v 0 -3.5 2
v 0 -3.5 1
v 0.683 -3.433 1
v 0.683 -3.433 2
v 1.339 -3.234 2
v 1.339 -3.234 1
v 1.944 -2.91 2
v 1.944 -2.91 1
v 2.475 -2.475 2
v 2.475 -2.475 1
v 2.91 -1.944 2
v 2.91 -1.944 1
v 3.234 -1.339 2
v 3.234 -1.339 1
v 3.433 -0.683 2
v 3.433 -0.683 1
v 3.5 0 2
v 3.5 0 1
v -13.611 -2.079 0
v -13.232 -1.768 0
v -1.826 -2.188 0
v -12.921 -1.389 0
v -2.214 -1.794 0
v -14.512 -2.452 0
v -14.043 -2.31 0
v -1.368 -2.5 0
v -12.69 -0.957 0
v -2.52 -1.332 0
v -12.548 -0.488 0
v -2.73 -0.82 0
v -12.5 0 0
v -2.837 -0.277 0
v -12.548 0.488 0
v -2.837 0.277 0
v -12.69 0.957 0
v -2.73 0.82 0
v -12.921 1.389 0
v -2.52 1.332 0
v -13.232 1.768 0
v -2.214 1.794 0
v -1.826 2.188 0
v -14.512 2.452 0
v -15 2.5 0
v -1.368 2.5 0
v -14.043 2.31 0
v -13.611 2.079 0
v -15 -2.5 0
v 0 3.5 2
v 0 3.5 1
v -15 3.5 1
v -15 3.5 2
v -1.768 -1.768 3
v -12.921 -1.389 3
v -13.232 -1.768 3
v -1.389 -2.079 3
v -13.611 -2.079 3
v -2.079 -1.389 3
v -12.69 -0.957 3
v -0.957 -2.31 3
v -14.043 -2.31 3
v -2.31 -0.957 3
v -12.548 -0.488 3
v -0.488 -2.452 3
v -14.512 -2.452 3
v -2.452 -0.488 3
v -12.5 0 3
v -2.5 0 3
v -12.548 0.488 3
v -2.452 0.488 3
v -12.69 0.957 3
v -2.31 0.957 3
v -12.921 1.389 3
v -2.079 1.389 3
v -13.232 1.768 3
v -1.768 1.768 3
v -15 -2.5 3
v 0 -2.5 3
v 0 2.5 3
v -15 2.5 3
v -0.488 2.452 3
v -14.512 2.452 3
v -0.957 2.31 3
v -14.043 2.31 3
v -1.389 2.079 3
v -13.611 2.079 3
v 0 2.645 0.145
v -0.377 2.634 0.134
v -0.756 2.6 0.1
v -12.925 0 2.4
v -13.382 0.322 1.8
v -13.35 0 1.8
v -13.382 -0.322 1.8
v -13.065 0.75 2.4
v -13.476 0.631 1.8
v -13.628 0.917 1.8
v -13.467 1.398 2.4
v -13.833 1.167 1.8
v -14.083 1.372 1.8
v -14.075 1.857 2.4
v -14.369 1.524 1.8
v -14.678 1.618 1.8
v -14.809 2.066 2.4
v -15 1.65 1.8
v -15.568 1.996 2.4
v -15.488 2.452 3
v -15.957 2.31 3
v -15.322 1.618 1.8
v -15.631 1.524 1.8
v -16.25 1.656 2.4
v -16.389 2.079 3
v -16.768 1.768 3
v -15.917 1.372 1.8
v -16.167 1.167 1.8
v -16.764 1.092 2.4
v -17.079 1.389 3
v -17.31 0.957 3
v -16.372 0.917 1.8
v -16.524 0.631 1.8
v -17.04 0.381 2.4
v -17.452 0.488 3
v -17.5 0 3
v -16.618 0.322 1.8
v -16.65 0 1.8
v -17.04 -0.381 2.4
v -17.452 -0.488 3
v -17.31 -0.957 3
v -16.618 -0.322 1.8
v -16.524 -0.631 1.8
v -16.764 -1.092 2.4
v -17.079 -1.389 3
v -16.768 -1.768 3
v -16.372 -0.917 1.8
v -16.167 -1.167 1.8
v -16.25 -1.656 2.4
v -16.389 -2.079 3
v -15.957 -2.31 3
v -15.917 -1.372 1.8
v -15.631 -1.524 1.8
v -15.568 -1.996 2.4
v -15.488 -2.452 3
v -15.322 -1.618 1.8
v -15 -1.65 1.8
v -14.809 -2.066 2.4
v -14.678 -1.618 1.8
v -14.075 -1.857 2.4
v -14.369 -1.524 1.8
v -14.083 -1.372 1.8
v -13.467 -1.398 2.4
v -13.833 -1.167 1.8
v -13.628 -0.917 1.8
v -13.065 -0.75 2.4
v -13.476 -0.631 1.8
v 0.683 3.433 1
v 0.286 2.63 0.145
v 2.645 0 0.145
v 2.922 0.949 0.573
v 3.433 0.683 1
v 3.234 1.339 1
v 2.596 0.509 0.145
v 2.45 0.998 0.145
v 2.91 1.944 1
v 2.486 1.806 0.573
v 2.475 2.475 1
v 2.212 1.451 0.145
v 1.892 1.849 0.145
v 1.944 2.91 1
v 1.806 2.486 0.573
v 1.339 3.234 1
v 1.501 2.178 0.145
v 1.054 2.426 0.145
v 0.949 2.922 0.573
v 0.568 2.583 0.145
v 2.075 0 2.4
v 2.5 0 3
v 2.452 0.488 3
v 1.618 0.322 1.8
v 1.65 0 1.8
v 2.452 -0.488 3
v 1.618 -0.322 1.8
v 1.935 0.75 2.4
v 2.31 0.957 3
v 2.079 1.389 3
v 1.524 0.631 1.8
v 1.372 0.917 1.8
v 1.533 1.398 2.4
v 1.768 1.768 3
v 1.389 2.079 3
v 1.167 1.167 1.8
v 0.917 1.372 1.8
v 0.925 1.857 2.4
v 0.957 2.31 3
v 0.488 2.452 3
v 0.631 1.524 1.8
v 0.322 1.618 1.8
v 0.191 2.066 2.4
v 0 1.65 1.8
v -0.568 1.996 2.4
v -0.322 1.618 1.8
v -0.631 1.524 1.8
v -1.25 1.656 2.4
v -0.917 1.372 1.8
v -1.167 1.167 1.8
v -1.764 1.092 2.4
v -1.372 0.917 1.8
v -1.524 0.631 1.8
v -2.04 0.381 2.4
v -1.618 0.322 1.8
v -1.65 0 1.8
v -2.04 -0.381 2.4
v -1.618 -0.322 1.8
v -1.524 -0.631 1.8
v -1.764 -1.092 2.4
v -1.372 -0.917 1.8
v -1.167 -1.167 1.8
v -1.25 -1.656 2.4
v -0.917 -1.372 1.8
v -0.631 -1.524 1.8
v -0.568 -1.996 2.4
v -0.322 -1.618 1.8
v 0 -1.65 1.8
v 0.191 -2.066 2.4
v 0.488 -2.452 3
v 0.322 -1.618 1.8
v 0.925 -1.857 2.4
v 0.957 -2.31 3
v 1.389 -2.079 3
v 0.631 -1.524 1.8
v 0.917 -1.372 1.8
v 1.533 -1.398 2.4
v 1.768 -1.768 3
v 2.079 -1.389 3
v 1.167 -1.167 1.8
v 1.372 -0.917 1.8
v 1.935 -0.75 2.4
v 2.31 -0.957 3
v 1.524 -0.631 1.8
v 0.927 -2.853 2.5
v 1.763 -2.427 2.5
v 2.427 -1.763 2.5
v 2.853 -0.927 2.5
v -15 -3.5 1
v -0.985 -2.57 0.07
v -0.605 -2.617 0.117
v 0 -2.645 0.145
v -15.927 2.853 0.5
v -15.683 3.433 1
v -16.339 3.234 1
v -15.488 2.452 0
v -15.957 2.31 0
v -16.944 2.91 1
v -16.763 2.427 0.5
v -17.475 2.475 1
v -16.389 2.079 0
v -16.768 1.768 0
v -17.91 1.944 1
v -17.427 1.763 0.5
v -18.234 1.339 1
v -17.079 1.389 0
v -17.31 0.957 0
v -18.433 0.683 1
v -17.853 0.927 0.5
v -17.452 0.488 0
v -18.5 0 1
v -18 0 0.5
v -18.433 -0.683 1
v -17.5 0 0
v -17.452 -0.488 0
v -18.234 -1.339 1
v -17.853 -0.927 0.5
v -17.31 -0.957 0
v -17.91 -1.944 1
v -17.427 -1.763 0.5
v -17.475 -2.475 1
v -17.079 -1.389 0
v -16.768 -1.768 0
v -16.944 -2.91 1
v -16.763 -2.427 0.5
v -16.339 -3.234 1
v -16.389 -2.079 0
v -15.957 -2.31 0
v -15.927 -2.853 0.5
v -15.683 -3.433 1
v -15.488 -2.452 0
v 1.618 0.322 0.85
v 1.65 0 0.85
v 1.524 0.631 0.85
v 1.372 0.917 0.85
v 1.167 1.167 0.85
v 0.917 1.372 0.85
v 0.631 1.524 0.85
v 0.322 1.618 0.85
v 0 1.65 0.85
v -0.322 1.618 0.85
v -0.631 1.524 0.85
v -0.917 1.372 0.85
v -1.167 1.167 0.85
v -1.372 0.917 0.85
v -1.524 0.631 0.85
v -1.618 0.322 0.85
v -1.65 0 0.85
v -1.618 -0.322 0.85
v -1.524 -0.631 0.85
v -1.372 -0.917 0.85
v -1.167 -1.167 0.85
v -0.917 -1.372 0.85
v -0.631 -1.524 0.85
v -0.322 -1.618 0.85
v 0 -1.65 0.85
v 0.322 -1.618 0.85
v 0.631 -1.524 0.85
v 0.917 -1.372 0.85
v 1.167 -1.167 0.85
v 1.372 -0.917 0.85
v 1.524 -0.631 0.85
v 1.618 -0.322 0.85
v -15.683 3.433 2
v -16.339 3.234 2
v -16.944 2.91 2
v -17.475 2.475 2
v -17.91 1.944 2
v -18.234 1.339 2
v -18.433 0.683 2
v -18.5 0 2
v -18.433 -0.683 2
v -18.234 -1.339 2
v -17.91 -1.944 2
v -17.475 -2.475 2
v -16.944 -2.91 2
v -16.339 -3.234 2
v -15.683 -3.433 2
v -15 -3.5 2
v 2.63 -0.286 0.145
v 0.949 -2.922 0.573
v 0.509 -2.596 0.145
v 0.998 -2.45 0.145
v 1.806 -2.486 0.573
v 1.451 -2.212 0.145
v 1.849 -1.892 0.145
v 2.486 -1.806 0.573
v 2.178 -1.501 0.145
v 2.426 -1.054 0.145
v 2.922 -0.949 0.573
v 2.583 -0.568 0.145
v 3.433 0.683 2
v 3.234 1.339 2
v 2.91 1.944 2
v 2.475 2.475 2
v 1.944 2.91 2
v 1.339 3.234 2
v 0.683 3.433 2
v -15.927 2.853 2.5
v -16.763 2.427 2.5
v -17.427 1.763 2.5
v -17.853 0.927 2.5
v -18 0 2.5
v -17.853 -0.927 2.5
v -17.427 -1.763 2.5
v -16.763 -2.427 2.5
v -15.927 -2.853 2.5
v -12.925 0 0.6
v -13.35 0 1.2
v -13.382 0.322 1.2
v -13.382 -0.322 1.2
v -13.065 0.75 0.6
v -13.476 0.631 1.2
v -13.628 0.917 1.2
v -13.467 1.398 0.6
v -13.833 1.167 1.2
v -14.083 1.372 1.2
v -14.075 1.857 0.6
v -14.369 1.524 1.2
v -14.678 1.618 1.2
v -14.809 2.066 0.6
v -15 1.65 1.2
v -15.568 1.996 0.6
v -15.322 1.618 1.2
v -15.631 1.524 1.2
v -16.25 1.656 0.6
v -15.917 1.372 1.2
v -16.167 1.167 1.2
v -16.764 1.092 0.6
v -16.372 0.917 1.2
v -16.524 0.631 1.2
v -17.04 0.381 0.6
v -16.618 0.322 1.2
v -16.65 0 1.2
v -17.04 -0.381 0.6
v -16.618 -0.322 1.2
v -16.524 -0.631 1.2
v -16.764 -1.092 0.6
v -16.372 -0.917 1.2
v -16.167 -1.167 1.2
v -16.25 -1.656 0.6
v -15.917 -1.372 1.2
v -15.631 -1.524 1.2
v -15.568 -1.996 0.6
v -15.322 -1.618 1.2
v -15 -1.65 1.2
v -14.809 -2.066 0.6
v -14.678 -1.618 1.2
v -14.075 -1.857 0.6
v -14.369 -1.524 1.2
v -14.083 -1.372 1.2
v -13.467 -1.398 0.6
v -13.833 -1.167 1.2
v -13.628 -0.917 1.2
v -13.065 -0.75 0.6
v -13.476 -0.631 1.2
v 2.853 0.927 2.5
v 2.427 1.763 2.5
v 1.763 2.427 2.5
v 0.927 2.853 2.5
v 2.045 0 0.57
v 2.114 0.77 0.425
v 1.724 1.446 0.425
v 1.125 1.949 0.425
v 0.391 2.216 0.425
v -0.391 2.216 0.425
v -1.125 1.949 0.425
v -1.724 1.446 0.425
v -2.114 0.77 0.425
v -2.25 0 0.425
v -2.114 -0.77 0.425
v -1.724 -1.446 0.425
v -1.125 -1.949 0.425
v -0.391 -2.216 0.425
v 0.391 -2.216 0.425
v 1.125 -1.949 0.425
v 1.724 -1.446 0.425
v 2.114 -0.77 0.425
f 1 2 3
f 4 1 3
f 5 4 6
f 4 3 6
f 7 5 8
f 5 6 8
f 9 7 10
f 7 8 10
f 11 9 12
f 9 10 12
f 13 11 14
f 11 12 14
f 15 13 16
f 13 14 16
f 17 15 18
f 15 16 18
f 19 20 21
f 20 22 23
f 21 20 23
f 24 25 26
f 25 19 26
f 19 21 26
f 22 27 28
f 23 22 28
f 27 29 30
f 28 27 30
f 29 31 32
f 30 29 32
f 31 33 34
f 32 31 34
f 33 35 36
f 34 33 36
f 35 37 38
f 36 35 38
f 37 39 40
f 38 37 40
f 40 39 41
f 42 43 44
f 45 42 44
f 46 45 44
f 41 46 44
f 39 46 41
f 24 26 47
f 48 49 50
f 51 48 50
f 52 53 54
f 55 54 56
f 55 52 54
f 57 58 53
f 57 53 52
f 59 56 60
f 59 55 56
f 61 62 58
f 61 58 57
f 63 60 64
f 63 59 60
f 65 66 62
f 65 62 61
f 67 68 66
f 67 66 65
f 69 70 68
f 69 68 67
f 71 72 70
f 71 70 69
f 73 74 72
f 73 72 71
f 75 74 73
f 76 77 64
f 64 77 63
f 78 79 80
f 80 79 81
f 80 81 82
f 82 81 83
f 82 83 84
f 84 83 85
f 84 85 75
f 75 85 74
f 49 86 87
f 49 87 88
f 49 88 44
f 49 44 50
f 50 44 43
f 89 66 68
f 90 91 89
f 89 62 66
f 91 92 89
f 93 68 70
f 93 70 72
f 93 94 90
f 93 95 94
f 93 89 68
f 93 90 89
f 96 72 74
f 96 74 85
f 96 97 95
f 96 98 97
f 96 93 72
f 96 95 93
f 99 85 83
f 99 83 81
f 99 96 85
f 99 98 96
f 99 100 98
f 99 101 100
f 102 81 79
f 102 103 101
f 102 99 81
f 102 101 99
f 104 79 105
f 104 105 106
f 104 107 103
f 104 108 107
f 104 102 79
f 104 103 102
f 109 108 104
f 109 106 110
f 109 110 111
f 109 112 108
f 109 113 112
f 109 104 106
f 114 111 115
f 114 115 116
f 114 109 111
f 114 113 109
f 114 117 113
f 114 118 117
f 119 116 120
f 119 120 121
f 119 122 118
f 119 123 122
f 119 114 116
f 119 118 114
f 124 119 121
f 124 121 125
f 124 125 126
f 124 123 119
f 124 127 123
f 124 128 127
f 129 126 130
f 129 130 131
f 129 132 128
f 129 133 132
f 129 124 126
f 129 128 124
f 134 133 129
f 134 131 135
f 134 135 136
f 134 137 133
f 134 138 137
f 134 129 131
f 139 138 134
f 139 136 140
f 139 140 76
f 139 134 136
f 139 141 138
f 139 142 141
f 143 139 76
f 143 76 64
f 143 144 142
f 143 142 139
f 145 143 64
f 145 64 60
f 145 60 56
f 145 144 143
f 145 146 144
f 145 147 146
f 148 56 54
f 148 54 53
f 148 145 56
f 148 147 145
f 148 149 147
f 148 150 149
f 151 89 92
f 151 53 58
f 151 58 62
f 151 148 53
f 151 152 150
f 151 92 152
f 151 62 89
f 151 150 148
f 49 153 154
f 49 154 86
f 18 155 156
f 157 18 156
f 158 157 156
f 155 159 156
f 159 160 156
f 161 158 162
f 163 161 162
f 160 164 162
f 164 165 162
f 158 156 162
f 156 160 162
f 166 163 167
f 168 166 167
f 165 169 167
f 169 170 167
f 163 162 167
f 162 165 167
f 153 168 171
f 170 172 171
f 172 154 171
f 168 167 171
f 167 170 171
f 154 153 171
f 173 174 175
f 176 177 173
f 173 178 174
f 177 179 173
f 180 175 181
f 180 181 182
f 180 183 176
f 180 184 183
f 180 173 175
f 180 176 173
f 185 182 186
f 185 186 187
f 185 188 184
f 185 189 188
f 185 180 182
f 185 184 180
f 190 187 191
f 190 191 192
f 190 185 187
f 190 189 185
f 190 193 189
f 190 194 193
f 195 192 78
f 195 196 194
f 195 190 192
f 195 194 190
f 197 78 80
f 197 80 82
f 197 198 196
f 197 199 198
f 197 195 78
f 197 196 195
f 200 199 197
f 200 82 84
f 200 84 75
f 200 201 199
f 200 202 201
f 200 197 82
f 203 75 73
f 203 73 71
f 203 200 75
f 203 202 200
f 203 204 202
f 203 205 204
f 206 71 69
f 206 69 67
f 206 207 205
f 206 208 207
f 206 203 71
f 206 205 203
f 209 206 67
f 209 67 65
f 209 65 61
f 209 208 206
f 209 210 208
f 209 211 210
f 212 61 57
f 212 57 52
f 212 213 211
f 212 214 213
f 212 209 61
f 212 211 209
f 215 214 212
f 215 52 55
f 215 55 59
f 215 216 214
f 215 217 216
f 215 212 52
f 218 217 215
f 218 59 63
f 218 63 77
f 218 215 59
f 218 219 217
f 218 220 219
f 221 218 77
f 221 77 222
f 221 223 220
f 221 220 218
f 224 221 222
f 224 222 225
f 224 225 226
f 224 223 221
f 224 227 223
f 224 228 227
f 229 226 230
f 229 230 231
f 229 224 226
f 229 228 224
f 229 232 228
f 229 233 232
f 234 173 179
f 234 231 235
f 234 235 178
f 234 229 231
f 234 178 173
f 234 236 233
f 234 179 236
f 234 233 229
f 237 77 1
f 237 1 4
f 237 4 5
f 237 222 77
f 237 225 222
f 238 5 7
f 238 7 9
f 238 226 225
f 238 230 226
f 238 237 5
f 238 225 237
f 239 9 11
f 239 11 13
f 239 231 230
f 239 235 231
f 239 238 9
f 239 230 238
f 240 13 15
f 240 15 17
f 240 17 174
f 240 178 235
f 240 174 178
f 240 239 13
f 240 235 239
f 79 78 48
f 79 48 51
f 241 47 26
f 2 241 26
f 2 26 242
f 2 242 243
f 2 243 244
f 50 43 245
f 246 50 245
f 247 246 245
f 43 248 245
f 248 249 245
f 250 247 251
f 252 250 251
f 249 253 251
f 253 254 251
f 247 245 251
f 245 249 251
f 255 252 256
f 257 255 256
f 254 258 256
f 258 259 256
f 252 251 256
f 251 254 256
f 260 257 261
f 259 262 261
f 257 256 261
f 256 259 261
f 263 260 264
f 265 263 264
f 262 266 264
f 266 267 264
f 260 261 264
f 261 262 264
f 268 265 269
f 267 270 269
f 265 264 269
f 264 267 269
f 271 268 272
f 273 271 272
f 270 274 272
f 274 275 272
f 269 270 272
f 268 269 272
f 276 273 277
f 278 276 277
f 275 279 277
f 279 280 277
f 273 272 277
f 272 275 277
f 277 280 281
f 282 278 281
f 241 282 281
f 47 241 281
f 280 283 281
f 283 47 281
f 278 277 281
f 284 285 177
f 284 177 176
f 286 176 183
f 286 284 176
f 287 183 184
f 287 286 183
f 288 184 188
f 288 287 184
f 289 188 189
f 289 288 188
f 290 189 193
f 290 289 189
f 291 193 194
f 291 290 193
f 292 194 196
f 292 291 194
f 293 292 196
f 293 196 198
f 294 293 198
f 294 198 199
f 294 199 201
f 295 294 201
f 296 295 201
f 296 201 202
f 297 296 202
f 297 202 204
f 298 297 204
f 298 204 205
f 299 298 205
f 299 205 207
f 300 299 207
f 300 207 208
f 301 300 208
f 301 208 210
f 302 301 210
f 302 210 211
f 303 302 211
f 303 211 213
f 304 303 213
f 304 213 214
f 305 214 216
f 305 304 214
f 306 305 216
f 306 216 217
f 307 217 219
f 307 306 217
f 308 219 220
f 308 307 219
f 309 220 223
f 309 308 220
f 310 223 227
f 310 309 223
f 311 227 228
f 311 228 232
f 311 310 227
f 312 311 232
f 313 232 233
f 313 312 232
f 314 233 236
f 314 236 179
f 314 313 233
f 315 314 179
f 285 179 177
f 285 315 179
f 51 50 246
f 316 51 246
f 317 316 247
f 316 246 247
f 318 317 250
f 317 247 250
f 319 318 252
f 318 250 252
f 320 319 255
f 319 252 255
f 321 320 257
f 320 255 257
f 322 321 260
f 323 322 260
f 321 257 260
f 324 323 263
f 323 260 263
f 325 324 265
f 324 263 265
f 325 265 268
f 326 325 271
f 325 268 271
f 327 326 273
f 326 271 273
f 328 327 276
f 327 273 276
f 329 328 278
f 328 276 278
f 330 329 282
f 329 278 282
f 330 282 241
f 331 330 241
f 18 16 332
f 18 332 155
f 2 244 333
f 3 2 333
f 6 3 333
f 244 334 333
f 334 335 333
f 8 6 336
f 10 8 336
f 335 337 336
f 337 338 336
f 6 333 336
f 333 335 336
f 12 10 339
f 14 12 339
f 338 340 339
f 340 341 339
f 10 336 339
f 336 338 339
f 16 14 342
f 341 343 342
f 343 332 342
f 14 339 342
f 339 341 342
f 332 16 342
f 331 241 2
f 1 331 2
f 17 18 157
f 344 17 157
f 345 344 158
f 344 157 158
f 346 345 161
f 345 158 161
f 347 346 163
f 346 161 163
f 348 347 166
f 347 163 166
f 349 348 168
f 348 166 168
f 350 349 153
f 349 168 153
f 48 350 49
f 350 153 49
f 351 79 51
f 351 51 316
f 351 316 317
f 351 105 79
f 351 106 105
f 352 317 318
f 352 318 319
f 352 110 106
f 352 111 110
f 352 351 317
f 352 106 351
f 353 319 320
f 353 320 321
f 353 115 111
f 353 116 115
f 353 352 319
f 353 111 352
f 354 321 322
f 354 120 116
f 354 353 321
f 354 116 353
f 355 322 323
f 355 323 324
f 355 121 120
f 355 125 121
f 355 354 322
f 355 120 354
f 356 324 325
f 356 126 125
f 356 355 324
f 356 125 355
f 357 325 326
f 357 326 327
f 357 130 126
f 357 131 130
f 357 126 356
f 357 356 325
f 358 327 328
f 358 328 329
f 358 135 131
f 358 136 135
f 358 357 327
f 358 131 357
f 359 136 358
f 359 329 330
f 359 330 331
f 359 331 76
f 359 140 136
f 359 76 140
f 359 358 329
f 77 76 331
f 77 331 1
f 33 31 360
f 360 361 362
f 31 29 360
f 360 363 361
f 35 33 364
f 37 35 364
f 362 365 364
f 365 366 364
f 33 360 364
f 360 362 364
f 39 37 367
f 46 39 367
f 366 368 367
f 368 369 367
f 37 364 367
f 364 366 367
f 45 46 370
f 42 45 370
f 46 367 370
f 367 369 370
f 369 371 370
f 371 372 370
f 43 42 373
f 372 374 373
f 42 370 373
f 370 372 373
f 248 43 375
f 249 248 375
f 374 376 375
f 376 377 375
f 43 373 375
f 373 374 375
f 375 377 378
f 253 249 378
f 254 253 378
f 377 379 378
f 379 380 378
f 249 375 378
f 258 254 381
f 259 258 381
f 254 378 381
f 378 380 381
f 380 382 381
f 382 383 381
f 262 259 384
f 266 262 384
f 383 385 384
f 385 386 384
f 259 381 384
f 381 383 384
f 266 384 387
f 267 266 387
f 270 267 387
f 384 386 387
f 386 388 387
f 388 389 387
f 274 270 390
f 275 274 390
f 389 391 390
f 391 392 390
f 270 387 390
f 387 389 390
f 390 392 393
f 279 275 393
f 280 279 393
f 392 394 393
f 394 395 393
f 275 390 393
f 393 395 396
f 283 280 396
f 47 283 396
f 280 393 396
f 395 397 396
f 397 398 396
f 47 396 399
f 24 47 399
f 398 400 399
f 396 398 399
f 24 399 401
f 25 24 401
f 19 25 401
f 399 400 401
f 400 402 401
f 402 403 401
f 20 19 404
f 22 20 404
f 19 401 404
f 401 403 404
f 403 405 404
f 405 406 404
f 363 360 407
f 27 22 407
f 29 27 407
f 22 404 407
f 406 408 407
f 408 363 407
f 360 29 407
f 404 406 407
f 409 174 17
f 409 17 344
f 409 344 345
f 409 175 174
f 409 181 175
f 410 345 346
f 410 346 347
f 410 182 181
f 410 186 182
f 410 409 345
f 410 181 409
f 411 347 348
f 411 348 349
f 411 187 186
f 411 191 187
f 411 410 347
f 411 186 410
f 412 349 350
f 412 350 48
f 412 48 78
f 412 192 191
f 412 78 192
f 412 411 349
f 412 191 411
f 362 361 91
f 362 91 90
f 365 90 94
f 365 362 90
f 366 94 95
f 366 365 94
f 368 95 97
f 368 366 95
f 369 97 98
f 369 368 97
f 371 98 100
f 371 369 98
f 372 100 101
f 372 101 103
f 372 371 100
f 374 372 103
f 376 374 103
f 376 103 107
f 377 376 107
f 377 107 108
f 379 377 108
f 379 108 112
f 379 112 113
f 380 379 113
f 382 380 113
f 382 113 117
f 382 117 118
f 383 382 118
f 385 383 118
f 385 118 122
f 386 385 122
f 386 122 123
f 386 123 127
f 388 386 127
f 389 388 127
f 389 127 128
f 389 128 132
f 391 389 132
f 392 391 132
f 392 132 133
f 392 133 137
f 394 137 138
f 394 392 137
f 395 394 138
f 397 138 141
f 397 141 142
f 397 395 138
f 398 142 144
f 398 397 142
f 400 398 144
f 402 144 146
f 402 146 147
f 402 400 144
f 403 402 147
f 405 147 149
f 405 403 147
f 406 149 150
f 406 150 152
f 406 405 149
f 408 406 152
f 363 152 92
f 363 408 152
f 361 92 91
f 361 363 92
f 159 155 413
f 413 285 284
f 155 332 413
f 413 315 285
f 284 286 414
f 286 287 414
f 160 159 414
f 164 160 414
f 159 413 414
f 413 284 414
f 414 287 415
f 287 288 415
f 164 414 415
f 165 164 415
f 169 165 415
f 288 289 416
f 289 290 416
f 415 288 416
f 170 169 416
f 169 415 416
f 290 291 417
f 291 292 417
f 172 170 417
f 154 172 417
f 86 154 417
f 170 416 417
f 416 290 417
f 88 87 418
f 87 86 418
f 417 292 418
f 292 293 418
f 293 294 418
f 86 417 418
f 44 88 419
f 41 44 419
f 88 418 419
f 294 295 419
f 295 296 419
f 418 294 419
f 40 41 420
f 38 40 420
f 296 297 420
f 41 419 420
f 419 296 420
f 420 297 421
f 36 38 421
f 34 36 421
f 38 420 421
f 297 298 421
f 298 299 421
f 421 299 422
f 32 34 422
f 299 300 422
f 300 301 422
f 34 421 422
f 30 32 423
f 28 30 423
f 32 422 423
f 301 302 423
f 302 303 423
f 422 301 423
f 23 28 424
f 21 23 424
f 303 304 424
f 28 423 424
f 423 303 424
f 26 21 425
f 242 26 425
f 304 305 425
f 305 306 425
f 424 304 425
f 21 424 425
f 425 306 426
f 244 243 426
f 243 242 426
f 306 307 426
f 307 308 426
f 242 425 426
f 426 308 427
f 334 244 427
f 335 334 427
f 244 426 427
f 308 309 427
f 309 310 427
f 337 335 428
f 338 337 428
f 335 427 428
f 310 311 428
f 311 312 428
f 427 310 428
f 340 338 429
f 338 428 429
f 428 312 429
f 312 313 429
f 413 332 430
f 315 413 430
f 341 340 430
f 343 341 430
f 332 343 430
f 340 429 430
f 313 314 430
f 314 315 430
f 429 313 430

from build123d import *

# Parameters (mm, degrees)
F0_R     = 1.65
F1_DEPTH = 3
F2_SIZE  = 1


# Not quite as in the source:
# - a fillet or chamfer that OpenCascade refuses, or shapes differently, is made with other operations: its cross-section is extruded or revolved along the edge and cut away or added


with BuildPart() as f1:
    # F0 (on Top) → F1 (new body)
    with BuildSketch(Plane.XY):
        with BuildLine():
            ThreePointArc((-15, -3.5), (-12.5251262658, -2.4748737342), (-11.5, 0))
            ThreePointArc((-11.5, 0), (-12.5251262658, 2.4748737342), (-15, 3.5))
            ThreePointArc((-15, 3.5), (-18.5, 0), (-15, -3.5))
        make_face()
        with Locations((-15, 0)):
            Circle(F0_R, mode=Mode.SUBTRACT)
        with BuildLine():
            ThreePointArc((-15, 3.5), (-12.5251262658, 2.4748737342), (-11.5, 0))
            ThreePointArc((-11.5, 0), (-12.5251262658, -2.4748737342), (-15, -3.5))
            Line((-15, -3.5), (0, -3.5))
            ThreePointArc((0, -3.5), (-3.5, 0), (0, 3.5))
            Line((0, 3.5), (-15, 3.5))
        make_face()
        with BuildLine():
            ThreePointArc((3.5, 0), (2.4748737342, 2.4748737342), (0, 3.5))
            ThreePointArc((0, 3.5), (-3.5, 0), (0, -3.5))
            ThreePointArc((0, -3.5), (2.4748737342, -2.4748737342), (3.5, 0))
        make_face()
        Circle(F0_R, mode=Mode.SUBTRACT)
    extrude(amount=F1_DEPTH)

    # F2
    f2_edges = [f1.edges().sort_by_distance(p)[0] for p in [
        (-7.5, -3.5, 3),
        (-18.5, 0, 3),
        (3.5, 0, 3),
        (-7.5, 3.5, 3),
        (-7.5, -3.5, 0),
        (-18.5, 0, 0),
        (3.5, 0, 0),
        (-7.5, 3.5, 0),
    ]]
    chamfer(f2_edges, length=F2_SIZE)

    # F3: chamfer of 1.2 x 0.85 on 4 edges, made by hand

    # F3_s1 → F3_t2 (revolve, cut)
    with BuildSketch(Plane.XZ):
        Polygon((-12.5, 3), (-13.35, 1.8), (-13.35, 3), align=None)
    revolve(axis=Axis((-15, 0, 3), (0, 0, 1)), mode=Mode.SUBTRACT)

    # F3_s3 → F3_t4 (revolve, cut)
    with BuildSketch(Plane.XZ):
        Polygon((2.5, 3), (1.65, 1.8), (1.65, 3), align=None)
    revolve(axis=Axis((0, 0, 3), (0, 0, 1)), mode=Mode.SUBTRACT)

    # F3_s5 → F3_t6 (revolve, cut)
    with BuildSketch(Plane.XZ):
        Polygon((2.85, 0), (1.65, 0.85), (1.65, 0), align=None)
    revolve(axis=Axis((0, 0, 0), (0, 0, 1)), mode=Mode.SUBTRACT)

    # F3_s7 → F3_t8 (revolve, cut)
    with BuildSketch(Plane.XZ):
        Polygon((-12.5, 0), (-13.35, 1.2), (-13.35, 0), align=None)
    revolve(axis=Axis((-15, 0, 0), (0, 0, 1)), mode=Mode.SUBTRACT)


solid = f1.part
